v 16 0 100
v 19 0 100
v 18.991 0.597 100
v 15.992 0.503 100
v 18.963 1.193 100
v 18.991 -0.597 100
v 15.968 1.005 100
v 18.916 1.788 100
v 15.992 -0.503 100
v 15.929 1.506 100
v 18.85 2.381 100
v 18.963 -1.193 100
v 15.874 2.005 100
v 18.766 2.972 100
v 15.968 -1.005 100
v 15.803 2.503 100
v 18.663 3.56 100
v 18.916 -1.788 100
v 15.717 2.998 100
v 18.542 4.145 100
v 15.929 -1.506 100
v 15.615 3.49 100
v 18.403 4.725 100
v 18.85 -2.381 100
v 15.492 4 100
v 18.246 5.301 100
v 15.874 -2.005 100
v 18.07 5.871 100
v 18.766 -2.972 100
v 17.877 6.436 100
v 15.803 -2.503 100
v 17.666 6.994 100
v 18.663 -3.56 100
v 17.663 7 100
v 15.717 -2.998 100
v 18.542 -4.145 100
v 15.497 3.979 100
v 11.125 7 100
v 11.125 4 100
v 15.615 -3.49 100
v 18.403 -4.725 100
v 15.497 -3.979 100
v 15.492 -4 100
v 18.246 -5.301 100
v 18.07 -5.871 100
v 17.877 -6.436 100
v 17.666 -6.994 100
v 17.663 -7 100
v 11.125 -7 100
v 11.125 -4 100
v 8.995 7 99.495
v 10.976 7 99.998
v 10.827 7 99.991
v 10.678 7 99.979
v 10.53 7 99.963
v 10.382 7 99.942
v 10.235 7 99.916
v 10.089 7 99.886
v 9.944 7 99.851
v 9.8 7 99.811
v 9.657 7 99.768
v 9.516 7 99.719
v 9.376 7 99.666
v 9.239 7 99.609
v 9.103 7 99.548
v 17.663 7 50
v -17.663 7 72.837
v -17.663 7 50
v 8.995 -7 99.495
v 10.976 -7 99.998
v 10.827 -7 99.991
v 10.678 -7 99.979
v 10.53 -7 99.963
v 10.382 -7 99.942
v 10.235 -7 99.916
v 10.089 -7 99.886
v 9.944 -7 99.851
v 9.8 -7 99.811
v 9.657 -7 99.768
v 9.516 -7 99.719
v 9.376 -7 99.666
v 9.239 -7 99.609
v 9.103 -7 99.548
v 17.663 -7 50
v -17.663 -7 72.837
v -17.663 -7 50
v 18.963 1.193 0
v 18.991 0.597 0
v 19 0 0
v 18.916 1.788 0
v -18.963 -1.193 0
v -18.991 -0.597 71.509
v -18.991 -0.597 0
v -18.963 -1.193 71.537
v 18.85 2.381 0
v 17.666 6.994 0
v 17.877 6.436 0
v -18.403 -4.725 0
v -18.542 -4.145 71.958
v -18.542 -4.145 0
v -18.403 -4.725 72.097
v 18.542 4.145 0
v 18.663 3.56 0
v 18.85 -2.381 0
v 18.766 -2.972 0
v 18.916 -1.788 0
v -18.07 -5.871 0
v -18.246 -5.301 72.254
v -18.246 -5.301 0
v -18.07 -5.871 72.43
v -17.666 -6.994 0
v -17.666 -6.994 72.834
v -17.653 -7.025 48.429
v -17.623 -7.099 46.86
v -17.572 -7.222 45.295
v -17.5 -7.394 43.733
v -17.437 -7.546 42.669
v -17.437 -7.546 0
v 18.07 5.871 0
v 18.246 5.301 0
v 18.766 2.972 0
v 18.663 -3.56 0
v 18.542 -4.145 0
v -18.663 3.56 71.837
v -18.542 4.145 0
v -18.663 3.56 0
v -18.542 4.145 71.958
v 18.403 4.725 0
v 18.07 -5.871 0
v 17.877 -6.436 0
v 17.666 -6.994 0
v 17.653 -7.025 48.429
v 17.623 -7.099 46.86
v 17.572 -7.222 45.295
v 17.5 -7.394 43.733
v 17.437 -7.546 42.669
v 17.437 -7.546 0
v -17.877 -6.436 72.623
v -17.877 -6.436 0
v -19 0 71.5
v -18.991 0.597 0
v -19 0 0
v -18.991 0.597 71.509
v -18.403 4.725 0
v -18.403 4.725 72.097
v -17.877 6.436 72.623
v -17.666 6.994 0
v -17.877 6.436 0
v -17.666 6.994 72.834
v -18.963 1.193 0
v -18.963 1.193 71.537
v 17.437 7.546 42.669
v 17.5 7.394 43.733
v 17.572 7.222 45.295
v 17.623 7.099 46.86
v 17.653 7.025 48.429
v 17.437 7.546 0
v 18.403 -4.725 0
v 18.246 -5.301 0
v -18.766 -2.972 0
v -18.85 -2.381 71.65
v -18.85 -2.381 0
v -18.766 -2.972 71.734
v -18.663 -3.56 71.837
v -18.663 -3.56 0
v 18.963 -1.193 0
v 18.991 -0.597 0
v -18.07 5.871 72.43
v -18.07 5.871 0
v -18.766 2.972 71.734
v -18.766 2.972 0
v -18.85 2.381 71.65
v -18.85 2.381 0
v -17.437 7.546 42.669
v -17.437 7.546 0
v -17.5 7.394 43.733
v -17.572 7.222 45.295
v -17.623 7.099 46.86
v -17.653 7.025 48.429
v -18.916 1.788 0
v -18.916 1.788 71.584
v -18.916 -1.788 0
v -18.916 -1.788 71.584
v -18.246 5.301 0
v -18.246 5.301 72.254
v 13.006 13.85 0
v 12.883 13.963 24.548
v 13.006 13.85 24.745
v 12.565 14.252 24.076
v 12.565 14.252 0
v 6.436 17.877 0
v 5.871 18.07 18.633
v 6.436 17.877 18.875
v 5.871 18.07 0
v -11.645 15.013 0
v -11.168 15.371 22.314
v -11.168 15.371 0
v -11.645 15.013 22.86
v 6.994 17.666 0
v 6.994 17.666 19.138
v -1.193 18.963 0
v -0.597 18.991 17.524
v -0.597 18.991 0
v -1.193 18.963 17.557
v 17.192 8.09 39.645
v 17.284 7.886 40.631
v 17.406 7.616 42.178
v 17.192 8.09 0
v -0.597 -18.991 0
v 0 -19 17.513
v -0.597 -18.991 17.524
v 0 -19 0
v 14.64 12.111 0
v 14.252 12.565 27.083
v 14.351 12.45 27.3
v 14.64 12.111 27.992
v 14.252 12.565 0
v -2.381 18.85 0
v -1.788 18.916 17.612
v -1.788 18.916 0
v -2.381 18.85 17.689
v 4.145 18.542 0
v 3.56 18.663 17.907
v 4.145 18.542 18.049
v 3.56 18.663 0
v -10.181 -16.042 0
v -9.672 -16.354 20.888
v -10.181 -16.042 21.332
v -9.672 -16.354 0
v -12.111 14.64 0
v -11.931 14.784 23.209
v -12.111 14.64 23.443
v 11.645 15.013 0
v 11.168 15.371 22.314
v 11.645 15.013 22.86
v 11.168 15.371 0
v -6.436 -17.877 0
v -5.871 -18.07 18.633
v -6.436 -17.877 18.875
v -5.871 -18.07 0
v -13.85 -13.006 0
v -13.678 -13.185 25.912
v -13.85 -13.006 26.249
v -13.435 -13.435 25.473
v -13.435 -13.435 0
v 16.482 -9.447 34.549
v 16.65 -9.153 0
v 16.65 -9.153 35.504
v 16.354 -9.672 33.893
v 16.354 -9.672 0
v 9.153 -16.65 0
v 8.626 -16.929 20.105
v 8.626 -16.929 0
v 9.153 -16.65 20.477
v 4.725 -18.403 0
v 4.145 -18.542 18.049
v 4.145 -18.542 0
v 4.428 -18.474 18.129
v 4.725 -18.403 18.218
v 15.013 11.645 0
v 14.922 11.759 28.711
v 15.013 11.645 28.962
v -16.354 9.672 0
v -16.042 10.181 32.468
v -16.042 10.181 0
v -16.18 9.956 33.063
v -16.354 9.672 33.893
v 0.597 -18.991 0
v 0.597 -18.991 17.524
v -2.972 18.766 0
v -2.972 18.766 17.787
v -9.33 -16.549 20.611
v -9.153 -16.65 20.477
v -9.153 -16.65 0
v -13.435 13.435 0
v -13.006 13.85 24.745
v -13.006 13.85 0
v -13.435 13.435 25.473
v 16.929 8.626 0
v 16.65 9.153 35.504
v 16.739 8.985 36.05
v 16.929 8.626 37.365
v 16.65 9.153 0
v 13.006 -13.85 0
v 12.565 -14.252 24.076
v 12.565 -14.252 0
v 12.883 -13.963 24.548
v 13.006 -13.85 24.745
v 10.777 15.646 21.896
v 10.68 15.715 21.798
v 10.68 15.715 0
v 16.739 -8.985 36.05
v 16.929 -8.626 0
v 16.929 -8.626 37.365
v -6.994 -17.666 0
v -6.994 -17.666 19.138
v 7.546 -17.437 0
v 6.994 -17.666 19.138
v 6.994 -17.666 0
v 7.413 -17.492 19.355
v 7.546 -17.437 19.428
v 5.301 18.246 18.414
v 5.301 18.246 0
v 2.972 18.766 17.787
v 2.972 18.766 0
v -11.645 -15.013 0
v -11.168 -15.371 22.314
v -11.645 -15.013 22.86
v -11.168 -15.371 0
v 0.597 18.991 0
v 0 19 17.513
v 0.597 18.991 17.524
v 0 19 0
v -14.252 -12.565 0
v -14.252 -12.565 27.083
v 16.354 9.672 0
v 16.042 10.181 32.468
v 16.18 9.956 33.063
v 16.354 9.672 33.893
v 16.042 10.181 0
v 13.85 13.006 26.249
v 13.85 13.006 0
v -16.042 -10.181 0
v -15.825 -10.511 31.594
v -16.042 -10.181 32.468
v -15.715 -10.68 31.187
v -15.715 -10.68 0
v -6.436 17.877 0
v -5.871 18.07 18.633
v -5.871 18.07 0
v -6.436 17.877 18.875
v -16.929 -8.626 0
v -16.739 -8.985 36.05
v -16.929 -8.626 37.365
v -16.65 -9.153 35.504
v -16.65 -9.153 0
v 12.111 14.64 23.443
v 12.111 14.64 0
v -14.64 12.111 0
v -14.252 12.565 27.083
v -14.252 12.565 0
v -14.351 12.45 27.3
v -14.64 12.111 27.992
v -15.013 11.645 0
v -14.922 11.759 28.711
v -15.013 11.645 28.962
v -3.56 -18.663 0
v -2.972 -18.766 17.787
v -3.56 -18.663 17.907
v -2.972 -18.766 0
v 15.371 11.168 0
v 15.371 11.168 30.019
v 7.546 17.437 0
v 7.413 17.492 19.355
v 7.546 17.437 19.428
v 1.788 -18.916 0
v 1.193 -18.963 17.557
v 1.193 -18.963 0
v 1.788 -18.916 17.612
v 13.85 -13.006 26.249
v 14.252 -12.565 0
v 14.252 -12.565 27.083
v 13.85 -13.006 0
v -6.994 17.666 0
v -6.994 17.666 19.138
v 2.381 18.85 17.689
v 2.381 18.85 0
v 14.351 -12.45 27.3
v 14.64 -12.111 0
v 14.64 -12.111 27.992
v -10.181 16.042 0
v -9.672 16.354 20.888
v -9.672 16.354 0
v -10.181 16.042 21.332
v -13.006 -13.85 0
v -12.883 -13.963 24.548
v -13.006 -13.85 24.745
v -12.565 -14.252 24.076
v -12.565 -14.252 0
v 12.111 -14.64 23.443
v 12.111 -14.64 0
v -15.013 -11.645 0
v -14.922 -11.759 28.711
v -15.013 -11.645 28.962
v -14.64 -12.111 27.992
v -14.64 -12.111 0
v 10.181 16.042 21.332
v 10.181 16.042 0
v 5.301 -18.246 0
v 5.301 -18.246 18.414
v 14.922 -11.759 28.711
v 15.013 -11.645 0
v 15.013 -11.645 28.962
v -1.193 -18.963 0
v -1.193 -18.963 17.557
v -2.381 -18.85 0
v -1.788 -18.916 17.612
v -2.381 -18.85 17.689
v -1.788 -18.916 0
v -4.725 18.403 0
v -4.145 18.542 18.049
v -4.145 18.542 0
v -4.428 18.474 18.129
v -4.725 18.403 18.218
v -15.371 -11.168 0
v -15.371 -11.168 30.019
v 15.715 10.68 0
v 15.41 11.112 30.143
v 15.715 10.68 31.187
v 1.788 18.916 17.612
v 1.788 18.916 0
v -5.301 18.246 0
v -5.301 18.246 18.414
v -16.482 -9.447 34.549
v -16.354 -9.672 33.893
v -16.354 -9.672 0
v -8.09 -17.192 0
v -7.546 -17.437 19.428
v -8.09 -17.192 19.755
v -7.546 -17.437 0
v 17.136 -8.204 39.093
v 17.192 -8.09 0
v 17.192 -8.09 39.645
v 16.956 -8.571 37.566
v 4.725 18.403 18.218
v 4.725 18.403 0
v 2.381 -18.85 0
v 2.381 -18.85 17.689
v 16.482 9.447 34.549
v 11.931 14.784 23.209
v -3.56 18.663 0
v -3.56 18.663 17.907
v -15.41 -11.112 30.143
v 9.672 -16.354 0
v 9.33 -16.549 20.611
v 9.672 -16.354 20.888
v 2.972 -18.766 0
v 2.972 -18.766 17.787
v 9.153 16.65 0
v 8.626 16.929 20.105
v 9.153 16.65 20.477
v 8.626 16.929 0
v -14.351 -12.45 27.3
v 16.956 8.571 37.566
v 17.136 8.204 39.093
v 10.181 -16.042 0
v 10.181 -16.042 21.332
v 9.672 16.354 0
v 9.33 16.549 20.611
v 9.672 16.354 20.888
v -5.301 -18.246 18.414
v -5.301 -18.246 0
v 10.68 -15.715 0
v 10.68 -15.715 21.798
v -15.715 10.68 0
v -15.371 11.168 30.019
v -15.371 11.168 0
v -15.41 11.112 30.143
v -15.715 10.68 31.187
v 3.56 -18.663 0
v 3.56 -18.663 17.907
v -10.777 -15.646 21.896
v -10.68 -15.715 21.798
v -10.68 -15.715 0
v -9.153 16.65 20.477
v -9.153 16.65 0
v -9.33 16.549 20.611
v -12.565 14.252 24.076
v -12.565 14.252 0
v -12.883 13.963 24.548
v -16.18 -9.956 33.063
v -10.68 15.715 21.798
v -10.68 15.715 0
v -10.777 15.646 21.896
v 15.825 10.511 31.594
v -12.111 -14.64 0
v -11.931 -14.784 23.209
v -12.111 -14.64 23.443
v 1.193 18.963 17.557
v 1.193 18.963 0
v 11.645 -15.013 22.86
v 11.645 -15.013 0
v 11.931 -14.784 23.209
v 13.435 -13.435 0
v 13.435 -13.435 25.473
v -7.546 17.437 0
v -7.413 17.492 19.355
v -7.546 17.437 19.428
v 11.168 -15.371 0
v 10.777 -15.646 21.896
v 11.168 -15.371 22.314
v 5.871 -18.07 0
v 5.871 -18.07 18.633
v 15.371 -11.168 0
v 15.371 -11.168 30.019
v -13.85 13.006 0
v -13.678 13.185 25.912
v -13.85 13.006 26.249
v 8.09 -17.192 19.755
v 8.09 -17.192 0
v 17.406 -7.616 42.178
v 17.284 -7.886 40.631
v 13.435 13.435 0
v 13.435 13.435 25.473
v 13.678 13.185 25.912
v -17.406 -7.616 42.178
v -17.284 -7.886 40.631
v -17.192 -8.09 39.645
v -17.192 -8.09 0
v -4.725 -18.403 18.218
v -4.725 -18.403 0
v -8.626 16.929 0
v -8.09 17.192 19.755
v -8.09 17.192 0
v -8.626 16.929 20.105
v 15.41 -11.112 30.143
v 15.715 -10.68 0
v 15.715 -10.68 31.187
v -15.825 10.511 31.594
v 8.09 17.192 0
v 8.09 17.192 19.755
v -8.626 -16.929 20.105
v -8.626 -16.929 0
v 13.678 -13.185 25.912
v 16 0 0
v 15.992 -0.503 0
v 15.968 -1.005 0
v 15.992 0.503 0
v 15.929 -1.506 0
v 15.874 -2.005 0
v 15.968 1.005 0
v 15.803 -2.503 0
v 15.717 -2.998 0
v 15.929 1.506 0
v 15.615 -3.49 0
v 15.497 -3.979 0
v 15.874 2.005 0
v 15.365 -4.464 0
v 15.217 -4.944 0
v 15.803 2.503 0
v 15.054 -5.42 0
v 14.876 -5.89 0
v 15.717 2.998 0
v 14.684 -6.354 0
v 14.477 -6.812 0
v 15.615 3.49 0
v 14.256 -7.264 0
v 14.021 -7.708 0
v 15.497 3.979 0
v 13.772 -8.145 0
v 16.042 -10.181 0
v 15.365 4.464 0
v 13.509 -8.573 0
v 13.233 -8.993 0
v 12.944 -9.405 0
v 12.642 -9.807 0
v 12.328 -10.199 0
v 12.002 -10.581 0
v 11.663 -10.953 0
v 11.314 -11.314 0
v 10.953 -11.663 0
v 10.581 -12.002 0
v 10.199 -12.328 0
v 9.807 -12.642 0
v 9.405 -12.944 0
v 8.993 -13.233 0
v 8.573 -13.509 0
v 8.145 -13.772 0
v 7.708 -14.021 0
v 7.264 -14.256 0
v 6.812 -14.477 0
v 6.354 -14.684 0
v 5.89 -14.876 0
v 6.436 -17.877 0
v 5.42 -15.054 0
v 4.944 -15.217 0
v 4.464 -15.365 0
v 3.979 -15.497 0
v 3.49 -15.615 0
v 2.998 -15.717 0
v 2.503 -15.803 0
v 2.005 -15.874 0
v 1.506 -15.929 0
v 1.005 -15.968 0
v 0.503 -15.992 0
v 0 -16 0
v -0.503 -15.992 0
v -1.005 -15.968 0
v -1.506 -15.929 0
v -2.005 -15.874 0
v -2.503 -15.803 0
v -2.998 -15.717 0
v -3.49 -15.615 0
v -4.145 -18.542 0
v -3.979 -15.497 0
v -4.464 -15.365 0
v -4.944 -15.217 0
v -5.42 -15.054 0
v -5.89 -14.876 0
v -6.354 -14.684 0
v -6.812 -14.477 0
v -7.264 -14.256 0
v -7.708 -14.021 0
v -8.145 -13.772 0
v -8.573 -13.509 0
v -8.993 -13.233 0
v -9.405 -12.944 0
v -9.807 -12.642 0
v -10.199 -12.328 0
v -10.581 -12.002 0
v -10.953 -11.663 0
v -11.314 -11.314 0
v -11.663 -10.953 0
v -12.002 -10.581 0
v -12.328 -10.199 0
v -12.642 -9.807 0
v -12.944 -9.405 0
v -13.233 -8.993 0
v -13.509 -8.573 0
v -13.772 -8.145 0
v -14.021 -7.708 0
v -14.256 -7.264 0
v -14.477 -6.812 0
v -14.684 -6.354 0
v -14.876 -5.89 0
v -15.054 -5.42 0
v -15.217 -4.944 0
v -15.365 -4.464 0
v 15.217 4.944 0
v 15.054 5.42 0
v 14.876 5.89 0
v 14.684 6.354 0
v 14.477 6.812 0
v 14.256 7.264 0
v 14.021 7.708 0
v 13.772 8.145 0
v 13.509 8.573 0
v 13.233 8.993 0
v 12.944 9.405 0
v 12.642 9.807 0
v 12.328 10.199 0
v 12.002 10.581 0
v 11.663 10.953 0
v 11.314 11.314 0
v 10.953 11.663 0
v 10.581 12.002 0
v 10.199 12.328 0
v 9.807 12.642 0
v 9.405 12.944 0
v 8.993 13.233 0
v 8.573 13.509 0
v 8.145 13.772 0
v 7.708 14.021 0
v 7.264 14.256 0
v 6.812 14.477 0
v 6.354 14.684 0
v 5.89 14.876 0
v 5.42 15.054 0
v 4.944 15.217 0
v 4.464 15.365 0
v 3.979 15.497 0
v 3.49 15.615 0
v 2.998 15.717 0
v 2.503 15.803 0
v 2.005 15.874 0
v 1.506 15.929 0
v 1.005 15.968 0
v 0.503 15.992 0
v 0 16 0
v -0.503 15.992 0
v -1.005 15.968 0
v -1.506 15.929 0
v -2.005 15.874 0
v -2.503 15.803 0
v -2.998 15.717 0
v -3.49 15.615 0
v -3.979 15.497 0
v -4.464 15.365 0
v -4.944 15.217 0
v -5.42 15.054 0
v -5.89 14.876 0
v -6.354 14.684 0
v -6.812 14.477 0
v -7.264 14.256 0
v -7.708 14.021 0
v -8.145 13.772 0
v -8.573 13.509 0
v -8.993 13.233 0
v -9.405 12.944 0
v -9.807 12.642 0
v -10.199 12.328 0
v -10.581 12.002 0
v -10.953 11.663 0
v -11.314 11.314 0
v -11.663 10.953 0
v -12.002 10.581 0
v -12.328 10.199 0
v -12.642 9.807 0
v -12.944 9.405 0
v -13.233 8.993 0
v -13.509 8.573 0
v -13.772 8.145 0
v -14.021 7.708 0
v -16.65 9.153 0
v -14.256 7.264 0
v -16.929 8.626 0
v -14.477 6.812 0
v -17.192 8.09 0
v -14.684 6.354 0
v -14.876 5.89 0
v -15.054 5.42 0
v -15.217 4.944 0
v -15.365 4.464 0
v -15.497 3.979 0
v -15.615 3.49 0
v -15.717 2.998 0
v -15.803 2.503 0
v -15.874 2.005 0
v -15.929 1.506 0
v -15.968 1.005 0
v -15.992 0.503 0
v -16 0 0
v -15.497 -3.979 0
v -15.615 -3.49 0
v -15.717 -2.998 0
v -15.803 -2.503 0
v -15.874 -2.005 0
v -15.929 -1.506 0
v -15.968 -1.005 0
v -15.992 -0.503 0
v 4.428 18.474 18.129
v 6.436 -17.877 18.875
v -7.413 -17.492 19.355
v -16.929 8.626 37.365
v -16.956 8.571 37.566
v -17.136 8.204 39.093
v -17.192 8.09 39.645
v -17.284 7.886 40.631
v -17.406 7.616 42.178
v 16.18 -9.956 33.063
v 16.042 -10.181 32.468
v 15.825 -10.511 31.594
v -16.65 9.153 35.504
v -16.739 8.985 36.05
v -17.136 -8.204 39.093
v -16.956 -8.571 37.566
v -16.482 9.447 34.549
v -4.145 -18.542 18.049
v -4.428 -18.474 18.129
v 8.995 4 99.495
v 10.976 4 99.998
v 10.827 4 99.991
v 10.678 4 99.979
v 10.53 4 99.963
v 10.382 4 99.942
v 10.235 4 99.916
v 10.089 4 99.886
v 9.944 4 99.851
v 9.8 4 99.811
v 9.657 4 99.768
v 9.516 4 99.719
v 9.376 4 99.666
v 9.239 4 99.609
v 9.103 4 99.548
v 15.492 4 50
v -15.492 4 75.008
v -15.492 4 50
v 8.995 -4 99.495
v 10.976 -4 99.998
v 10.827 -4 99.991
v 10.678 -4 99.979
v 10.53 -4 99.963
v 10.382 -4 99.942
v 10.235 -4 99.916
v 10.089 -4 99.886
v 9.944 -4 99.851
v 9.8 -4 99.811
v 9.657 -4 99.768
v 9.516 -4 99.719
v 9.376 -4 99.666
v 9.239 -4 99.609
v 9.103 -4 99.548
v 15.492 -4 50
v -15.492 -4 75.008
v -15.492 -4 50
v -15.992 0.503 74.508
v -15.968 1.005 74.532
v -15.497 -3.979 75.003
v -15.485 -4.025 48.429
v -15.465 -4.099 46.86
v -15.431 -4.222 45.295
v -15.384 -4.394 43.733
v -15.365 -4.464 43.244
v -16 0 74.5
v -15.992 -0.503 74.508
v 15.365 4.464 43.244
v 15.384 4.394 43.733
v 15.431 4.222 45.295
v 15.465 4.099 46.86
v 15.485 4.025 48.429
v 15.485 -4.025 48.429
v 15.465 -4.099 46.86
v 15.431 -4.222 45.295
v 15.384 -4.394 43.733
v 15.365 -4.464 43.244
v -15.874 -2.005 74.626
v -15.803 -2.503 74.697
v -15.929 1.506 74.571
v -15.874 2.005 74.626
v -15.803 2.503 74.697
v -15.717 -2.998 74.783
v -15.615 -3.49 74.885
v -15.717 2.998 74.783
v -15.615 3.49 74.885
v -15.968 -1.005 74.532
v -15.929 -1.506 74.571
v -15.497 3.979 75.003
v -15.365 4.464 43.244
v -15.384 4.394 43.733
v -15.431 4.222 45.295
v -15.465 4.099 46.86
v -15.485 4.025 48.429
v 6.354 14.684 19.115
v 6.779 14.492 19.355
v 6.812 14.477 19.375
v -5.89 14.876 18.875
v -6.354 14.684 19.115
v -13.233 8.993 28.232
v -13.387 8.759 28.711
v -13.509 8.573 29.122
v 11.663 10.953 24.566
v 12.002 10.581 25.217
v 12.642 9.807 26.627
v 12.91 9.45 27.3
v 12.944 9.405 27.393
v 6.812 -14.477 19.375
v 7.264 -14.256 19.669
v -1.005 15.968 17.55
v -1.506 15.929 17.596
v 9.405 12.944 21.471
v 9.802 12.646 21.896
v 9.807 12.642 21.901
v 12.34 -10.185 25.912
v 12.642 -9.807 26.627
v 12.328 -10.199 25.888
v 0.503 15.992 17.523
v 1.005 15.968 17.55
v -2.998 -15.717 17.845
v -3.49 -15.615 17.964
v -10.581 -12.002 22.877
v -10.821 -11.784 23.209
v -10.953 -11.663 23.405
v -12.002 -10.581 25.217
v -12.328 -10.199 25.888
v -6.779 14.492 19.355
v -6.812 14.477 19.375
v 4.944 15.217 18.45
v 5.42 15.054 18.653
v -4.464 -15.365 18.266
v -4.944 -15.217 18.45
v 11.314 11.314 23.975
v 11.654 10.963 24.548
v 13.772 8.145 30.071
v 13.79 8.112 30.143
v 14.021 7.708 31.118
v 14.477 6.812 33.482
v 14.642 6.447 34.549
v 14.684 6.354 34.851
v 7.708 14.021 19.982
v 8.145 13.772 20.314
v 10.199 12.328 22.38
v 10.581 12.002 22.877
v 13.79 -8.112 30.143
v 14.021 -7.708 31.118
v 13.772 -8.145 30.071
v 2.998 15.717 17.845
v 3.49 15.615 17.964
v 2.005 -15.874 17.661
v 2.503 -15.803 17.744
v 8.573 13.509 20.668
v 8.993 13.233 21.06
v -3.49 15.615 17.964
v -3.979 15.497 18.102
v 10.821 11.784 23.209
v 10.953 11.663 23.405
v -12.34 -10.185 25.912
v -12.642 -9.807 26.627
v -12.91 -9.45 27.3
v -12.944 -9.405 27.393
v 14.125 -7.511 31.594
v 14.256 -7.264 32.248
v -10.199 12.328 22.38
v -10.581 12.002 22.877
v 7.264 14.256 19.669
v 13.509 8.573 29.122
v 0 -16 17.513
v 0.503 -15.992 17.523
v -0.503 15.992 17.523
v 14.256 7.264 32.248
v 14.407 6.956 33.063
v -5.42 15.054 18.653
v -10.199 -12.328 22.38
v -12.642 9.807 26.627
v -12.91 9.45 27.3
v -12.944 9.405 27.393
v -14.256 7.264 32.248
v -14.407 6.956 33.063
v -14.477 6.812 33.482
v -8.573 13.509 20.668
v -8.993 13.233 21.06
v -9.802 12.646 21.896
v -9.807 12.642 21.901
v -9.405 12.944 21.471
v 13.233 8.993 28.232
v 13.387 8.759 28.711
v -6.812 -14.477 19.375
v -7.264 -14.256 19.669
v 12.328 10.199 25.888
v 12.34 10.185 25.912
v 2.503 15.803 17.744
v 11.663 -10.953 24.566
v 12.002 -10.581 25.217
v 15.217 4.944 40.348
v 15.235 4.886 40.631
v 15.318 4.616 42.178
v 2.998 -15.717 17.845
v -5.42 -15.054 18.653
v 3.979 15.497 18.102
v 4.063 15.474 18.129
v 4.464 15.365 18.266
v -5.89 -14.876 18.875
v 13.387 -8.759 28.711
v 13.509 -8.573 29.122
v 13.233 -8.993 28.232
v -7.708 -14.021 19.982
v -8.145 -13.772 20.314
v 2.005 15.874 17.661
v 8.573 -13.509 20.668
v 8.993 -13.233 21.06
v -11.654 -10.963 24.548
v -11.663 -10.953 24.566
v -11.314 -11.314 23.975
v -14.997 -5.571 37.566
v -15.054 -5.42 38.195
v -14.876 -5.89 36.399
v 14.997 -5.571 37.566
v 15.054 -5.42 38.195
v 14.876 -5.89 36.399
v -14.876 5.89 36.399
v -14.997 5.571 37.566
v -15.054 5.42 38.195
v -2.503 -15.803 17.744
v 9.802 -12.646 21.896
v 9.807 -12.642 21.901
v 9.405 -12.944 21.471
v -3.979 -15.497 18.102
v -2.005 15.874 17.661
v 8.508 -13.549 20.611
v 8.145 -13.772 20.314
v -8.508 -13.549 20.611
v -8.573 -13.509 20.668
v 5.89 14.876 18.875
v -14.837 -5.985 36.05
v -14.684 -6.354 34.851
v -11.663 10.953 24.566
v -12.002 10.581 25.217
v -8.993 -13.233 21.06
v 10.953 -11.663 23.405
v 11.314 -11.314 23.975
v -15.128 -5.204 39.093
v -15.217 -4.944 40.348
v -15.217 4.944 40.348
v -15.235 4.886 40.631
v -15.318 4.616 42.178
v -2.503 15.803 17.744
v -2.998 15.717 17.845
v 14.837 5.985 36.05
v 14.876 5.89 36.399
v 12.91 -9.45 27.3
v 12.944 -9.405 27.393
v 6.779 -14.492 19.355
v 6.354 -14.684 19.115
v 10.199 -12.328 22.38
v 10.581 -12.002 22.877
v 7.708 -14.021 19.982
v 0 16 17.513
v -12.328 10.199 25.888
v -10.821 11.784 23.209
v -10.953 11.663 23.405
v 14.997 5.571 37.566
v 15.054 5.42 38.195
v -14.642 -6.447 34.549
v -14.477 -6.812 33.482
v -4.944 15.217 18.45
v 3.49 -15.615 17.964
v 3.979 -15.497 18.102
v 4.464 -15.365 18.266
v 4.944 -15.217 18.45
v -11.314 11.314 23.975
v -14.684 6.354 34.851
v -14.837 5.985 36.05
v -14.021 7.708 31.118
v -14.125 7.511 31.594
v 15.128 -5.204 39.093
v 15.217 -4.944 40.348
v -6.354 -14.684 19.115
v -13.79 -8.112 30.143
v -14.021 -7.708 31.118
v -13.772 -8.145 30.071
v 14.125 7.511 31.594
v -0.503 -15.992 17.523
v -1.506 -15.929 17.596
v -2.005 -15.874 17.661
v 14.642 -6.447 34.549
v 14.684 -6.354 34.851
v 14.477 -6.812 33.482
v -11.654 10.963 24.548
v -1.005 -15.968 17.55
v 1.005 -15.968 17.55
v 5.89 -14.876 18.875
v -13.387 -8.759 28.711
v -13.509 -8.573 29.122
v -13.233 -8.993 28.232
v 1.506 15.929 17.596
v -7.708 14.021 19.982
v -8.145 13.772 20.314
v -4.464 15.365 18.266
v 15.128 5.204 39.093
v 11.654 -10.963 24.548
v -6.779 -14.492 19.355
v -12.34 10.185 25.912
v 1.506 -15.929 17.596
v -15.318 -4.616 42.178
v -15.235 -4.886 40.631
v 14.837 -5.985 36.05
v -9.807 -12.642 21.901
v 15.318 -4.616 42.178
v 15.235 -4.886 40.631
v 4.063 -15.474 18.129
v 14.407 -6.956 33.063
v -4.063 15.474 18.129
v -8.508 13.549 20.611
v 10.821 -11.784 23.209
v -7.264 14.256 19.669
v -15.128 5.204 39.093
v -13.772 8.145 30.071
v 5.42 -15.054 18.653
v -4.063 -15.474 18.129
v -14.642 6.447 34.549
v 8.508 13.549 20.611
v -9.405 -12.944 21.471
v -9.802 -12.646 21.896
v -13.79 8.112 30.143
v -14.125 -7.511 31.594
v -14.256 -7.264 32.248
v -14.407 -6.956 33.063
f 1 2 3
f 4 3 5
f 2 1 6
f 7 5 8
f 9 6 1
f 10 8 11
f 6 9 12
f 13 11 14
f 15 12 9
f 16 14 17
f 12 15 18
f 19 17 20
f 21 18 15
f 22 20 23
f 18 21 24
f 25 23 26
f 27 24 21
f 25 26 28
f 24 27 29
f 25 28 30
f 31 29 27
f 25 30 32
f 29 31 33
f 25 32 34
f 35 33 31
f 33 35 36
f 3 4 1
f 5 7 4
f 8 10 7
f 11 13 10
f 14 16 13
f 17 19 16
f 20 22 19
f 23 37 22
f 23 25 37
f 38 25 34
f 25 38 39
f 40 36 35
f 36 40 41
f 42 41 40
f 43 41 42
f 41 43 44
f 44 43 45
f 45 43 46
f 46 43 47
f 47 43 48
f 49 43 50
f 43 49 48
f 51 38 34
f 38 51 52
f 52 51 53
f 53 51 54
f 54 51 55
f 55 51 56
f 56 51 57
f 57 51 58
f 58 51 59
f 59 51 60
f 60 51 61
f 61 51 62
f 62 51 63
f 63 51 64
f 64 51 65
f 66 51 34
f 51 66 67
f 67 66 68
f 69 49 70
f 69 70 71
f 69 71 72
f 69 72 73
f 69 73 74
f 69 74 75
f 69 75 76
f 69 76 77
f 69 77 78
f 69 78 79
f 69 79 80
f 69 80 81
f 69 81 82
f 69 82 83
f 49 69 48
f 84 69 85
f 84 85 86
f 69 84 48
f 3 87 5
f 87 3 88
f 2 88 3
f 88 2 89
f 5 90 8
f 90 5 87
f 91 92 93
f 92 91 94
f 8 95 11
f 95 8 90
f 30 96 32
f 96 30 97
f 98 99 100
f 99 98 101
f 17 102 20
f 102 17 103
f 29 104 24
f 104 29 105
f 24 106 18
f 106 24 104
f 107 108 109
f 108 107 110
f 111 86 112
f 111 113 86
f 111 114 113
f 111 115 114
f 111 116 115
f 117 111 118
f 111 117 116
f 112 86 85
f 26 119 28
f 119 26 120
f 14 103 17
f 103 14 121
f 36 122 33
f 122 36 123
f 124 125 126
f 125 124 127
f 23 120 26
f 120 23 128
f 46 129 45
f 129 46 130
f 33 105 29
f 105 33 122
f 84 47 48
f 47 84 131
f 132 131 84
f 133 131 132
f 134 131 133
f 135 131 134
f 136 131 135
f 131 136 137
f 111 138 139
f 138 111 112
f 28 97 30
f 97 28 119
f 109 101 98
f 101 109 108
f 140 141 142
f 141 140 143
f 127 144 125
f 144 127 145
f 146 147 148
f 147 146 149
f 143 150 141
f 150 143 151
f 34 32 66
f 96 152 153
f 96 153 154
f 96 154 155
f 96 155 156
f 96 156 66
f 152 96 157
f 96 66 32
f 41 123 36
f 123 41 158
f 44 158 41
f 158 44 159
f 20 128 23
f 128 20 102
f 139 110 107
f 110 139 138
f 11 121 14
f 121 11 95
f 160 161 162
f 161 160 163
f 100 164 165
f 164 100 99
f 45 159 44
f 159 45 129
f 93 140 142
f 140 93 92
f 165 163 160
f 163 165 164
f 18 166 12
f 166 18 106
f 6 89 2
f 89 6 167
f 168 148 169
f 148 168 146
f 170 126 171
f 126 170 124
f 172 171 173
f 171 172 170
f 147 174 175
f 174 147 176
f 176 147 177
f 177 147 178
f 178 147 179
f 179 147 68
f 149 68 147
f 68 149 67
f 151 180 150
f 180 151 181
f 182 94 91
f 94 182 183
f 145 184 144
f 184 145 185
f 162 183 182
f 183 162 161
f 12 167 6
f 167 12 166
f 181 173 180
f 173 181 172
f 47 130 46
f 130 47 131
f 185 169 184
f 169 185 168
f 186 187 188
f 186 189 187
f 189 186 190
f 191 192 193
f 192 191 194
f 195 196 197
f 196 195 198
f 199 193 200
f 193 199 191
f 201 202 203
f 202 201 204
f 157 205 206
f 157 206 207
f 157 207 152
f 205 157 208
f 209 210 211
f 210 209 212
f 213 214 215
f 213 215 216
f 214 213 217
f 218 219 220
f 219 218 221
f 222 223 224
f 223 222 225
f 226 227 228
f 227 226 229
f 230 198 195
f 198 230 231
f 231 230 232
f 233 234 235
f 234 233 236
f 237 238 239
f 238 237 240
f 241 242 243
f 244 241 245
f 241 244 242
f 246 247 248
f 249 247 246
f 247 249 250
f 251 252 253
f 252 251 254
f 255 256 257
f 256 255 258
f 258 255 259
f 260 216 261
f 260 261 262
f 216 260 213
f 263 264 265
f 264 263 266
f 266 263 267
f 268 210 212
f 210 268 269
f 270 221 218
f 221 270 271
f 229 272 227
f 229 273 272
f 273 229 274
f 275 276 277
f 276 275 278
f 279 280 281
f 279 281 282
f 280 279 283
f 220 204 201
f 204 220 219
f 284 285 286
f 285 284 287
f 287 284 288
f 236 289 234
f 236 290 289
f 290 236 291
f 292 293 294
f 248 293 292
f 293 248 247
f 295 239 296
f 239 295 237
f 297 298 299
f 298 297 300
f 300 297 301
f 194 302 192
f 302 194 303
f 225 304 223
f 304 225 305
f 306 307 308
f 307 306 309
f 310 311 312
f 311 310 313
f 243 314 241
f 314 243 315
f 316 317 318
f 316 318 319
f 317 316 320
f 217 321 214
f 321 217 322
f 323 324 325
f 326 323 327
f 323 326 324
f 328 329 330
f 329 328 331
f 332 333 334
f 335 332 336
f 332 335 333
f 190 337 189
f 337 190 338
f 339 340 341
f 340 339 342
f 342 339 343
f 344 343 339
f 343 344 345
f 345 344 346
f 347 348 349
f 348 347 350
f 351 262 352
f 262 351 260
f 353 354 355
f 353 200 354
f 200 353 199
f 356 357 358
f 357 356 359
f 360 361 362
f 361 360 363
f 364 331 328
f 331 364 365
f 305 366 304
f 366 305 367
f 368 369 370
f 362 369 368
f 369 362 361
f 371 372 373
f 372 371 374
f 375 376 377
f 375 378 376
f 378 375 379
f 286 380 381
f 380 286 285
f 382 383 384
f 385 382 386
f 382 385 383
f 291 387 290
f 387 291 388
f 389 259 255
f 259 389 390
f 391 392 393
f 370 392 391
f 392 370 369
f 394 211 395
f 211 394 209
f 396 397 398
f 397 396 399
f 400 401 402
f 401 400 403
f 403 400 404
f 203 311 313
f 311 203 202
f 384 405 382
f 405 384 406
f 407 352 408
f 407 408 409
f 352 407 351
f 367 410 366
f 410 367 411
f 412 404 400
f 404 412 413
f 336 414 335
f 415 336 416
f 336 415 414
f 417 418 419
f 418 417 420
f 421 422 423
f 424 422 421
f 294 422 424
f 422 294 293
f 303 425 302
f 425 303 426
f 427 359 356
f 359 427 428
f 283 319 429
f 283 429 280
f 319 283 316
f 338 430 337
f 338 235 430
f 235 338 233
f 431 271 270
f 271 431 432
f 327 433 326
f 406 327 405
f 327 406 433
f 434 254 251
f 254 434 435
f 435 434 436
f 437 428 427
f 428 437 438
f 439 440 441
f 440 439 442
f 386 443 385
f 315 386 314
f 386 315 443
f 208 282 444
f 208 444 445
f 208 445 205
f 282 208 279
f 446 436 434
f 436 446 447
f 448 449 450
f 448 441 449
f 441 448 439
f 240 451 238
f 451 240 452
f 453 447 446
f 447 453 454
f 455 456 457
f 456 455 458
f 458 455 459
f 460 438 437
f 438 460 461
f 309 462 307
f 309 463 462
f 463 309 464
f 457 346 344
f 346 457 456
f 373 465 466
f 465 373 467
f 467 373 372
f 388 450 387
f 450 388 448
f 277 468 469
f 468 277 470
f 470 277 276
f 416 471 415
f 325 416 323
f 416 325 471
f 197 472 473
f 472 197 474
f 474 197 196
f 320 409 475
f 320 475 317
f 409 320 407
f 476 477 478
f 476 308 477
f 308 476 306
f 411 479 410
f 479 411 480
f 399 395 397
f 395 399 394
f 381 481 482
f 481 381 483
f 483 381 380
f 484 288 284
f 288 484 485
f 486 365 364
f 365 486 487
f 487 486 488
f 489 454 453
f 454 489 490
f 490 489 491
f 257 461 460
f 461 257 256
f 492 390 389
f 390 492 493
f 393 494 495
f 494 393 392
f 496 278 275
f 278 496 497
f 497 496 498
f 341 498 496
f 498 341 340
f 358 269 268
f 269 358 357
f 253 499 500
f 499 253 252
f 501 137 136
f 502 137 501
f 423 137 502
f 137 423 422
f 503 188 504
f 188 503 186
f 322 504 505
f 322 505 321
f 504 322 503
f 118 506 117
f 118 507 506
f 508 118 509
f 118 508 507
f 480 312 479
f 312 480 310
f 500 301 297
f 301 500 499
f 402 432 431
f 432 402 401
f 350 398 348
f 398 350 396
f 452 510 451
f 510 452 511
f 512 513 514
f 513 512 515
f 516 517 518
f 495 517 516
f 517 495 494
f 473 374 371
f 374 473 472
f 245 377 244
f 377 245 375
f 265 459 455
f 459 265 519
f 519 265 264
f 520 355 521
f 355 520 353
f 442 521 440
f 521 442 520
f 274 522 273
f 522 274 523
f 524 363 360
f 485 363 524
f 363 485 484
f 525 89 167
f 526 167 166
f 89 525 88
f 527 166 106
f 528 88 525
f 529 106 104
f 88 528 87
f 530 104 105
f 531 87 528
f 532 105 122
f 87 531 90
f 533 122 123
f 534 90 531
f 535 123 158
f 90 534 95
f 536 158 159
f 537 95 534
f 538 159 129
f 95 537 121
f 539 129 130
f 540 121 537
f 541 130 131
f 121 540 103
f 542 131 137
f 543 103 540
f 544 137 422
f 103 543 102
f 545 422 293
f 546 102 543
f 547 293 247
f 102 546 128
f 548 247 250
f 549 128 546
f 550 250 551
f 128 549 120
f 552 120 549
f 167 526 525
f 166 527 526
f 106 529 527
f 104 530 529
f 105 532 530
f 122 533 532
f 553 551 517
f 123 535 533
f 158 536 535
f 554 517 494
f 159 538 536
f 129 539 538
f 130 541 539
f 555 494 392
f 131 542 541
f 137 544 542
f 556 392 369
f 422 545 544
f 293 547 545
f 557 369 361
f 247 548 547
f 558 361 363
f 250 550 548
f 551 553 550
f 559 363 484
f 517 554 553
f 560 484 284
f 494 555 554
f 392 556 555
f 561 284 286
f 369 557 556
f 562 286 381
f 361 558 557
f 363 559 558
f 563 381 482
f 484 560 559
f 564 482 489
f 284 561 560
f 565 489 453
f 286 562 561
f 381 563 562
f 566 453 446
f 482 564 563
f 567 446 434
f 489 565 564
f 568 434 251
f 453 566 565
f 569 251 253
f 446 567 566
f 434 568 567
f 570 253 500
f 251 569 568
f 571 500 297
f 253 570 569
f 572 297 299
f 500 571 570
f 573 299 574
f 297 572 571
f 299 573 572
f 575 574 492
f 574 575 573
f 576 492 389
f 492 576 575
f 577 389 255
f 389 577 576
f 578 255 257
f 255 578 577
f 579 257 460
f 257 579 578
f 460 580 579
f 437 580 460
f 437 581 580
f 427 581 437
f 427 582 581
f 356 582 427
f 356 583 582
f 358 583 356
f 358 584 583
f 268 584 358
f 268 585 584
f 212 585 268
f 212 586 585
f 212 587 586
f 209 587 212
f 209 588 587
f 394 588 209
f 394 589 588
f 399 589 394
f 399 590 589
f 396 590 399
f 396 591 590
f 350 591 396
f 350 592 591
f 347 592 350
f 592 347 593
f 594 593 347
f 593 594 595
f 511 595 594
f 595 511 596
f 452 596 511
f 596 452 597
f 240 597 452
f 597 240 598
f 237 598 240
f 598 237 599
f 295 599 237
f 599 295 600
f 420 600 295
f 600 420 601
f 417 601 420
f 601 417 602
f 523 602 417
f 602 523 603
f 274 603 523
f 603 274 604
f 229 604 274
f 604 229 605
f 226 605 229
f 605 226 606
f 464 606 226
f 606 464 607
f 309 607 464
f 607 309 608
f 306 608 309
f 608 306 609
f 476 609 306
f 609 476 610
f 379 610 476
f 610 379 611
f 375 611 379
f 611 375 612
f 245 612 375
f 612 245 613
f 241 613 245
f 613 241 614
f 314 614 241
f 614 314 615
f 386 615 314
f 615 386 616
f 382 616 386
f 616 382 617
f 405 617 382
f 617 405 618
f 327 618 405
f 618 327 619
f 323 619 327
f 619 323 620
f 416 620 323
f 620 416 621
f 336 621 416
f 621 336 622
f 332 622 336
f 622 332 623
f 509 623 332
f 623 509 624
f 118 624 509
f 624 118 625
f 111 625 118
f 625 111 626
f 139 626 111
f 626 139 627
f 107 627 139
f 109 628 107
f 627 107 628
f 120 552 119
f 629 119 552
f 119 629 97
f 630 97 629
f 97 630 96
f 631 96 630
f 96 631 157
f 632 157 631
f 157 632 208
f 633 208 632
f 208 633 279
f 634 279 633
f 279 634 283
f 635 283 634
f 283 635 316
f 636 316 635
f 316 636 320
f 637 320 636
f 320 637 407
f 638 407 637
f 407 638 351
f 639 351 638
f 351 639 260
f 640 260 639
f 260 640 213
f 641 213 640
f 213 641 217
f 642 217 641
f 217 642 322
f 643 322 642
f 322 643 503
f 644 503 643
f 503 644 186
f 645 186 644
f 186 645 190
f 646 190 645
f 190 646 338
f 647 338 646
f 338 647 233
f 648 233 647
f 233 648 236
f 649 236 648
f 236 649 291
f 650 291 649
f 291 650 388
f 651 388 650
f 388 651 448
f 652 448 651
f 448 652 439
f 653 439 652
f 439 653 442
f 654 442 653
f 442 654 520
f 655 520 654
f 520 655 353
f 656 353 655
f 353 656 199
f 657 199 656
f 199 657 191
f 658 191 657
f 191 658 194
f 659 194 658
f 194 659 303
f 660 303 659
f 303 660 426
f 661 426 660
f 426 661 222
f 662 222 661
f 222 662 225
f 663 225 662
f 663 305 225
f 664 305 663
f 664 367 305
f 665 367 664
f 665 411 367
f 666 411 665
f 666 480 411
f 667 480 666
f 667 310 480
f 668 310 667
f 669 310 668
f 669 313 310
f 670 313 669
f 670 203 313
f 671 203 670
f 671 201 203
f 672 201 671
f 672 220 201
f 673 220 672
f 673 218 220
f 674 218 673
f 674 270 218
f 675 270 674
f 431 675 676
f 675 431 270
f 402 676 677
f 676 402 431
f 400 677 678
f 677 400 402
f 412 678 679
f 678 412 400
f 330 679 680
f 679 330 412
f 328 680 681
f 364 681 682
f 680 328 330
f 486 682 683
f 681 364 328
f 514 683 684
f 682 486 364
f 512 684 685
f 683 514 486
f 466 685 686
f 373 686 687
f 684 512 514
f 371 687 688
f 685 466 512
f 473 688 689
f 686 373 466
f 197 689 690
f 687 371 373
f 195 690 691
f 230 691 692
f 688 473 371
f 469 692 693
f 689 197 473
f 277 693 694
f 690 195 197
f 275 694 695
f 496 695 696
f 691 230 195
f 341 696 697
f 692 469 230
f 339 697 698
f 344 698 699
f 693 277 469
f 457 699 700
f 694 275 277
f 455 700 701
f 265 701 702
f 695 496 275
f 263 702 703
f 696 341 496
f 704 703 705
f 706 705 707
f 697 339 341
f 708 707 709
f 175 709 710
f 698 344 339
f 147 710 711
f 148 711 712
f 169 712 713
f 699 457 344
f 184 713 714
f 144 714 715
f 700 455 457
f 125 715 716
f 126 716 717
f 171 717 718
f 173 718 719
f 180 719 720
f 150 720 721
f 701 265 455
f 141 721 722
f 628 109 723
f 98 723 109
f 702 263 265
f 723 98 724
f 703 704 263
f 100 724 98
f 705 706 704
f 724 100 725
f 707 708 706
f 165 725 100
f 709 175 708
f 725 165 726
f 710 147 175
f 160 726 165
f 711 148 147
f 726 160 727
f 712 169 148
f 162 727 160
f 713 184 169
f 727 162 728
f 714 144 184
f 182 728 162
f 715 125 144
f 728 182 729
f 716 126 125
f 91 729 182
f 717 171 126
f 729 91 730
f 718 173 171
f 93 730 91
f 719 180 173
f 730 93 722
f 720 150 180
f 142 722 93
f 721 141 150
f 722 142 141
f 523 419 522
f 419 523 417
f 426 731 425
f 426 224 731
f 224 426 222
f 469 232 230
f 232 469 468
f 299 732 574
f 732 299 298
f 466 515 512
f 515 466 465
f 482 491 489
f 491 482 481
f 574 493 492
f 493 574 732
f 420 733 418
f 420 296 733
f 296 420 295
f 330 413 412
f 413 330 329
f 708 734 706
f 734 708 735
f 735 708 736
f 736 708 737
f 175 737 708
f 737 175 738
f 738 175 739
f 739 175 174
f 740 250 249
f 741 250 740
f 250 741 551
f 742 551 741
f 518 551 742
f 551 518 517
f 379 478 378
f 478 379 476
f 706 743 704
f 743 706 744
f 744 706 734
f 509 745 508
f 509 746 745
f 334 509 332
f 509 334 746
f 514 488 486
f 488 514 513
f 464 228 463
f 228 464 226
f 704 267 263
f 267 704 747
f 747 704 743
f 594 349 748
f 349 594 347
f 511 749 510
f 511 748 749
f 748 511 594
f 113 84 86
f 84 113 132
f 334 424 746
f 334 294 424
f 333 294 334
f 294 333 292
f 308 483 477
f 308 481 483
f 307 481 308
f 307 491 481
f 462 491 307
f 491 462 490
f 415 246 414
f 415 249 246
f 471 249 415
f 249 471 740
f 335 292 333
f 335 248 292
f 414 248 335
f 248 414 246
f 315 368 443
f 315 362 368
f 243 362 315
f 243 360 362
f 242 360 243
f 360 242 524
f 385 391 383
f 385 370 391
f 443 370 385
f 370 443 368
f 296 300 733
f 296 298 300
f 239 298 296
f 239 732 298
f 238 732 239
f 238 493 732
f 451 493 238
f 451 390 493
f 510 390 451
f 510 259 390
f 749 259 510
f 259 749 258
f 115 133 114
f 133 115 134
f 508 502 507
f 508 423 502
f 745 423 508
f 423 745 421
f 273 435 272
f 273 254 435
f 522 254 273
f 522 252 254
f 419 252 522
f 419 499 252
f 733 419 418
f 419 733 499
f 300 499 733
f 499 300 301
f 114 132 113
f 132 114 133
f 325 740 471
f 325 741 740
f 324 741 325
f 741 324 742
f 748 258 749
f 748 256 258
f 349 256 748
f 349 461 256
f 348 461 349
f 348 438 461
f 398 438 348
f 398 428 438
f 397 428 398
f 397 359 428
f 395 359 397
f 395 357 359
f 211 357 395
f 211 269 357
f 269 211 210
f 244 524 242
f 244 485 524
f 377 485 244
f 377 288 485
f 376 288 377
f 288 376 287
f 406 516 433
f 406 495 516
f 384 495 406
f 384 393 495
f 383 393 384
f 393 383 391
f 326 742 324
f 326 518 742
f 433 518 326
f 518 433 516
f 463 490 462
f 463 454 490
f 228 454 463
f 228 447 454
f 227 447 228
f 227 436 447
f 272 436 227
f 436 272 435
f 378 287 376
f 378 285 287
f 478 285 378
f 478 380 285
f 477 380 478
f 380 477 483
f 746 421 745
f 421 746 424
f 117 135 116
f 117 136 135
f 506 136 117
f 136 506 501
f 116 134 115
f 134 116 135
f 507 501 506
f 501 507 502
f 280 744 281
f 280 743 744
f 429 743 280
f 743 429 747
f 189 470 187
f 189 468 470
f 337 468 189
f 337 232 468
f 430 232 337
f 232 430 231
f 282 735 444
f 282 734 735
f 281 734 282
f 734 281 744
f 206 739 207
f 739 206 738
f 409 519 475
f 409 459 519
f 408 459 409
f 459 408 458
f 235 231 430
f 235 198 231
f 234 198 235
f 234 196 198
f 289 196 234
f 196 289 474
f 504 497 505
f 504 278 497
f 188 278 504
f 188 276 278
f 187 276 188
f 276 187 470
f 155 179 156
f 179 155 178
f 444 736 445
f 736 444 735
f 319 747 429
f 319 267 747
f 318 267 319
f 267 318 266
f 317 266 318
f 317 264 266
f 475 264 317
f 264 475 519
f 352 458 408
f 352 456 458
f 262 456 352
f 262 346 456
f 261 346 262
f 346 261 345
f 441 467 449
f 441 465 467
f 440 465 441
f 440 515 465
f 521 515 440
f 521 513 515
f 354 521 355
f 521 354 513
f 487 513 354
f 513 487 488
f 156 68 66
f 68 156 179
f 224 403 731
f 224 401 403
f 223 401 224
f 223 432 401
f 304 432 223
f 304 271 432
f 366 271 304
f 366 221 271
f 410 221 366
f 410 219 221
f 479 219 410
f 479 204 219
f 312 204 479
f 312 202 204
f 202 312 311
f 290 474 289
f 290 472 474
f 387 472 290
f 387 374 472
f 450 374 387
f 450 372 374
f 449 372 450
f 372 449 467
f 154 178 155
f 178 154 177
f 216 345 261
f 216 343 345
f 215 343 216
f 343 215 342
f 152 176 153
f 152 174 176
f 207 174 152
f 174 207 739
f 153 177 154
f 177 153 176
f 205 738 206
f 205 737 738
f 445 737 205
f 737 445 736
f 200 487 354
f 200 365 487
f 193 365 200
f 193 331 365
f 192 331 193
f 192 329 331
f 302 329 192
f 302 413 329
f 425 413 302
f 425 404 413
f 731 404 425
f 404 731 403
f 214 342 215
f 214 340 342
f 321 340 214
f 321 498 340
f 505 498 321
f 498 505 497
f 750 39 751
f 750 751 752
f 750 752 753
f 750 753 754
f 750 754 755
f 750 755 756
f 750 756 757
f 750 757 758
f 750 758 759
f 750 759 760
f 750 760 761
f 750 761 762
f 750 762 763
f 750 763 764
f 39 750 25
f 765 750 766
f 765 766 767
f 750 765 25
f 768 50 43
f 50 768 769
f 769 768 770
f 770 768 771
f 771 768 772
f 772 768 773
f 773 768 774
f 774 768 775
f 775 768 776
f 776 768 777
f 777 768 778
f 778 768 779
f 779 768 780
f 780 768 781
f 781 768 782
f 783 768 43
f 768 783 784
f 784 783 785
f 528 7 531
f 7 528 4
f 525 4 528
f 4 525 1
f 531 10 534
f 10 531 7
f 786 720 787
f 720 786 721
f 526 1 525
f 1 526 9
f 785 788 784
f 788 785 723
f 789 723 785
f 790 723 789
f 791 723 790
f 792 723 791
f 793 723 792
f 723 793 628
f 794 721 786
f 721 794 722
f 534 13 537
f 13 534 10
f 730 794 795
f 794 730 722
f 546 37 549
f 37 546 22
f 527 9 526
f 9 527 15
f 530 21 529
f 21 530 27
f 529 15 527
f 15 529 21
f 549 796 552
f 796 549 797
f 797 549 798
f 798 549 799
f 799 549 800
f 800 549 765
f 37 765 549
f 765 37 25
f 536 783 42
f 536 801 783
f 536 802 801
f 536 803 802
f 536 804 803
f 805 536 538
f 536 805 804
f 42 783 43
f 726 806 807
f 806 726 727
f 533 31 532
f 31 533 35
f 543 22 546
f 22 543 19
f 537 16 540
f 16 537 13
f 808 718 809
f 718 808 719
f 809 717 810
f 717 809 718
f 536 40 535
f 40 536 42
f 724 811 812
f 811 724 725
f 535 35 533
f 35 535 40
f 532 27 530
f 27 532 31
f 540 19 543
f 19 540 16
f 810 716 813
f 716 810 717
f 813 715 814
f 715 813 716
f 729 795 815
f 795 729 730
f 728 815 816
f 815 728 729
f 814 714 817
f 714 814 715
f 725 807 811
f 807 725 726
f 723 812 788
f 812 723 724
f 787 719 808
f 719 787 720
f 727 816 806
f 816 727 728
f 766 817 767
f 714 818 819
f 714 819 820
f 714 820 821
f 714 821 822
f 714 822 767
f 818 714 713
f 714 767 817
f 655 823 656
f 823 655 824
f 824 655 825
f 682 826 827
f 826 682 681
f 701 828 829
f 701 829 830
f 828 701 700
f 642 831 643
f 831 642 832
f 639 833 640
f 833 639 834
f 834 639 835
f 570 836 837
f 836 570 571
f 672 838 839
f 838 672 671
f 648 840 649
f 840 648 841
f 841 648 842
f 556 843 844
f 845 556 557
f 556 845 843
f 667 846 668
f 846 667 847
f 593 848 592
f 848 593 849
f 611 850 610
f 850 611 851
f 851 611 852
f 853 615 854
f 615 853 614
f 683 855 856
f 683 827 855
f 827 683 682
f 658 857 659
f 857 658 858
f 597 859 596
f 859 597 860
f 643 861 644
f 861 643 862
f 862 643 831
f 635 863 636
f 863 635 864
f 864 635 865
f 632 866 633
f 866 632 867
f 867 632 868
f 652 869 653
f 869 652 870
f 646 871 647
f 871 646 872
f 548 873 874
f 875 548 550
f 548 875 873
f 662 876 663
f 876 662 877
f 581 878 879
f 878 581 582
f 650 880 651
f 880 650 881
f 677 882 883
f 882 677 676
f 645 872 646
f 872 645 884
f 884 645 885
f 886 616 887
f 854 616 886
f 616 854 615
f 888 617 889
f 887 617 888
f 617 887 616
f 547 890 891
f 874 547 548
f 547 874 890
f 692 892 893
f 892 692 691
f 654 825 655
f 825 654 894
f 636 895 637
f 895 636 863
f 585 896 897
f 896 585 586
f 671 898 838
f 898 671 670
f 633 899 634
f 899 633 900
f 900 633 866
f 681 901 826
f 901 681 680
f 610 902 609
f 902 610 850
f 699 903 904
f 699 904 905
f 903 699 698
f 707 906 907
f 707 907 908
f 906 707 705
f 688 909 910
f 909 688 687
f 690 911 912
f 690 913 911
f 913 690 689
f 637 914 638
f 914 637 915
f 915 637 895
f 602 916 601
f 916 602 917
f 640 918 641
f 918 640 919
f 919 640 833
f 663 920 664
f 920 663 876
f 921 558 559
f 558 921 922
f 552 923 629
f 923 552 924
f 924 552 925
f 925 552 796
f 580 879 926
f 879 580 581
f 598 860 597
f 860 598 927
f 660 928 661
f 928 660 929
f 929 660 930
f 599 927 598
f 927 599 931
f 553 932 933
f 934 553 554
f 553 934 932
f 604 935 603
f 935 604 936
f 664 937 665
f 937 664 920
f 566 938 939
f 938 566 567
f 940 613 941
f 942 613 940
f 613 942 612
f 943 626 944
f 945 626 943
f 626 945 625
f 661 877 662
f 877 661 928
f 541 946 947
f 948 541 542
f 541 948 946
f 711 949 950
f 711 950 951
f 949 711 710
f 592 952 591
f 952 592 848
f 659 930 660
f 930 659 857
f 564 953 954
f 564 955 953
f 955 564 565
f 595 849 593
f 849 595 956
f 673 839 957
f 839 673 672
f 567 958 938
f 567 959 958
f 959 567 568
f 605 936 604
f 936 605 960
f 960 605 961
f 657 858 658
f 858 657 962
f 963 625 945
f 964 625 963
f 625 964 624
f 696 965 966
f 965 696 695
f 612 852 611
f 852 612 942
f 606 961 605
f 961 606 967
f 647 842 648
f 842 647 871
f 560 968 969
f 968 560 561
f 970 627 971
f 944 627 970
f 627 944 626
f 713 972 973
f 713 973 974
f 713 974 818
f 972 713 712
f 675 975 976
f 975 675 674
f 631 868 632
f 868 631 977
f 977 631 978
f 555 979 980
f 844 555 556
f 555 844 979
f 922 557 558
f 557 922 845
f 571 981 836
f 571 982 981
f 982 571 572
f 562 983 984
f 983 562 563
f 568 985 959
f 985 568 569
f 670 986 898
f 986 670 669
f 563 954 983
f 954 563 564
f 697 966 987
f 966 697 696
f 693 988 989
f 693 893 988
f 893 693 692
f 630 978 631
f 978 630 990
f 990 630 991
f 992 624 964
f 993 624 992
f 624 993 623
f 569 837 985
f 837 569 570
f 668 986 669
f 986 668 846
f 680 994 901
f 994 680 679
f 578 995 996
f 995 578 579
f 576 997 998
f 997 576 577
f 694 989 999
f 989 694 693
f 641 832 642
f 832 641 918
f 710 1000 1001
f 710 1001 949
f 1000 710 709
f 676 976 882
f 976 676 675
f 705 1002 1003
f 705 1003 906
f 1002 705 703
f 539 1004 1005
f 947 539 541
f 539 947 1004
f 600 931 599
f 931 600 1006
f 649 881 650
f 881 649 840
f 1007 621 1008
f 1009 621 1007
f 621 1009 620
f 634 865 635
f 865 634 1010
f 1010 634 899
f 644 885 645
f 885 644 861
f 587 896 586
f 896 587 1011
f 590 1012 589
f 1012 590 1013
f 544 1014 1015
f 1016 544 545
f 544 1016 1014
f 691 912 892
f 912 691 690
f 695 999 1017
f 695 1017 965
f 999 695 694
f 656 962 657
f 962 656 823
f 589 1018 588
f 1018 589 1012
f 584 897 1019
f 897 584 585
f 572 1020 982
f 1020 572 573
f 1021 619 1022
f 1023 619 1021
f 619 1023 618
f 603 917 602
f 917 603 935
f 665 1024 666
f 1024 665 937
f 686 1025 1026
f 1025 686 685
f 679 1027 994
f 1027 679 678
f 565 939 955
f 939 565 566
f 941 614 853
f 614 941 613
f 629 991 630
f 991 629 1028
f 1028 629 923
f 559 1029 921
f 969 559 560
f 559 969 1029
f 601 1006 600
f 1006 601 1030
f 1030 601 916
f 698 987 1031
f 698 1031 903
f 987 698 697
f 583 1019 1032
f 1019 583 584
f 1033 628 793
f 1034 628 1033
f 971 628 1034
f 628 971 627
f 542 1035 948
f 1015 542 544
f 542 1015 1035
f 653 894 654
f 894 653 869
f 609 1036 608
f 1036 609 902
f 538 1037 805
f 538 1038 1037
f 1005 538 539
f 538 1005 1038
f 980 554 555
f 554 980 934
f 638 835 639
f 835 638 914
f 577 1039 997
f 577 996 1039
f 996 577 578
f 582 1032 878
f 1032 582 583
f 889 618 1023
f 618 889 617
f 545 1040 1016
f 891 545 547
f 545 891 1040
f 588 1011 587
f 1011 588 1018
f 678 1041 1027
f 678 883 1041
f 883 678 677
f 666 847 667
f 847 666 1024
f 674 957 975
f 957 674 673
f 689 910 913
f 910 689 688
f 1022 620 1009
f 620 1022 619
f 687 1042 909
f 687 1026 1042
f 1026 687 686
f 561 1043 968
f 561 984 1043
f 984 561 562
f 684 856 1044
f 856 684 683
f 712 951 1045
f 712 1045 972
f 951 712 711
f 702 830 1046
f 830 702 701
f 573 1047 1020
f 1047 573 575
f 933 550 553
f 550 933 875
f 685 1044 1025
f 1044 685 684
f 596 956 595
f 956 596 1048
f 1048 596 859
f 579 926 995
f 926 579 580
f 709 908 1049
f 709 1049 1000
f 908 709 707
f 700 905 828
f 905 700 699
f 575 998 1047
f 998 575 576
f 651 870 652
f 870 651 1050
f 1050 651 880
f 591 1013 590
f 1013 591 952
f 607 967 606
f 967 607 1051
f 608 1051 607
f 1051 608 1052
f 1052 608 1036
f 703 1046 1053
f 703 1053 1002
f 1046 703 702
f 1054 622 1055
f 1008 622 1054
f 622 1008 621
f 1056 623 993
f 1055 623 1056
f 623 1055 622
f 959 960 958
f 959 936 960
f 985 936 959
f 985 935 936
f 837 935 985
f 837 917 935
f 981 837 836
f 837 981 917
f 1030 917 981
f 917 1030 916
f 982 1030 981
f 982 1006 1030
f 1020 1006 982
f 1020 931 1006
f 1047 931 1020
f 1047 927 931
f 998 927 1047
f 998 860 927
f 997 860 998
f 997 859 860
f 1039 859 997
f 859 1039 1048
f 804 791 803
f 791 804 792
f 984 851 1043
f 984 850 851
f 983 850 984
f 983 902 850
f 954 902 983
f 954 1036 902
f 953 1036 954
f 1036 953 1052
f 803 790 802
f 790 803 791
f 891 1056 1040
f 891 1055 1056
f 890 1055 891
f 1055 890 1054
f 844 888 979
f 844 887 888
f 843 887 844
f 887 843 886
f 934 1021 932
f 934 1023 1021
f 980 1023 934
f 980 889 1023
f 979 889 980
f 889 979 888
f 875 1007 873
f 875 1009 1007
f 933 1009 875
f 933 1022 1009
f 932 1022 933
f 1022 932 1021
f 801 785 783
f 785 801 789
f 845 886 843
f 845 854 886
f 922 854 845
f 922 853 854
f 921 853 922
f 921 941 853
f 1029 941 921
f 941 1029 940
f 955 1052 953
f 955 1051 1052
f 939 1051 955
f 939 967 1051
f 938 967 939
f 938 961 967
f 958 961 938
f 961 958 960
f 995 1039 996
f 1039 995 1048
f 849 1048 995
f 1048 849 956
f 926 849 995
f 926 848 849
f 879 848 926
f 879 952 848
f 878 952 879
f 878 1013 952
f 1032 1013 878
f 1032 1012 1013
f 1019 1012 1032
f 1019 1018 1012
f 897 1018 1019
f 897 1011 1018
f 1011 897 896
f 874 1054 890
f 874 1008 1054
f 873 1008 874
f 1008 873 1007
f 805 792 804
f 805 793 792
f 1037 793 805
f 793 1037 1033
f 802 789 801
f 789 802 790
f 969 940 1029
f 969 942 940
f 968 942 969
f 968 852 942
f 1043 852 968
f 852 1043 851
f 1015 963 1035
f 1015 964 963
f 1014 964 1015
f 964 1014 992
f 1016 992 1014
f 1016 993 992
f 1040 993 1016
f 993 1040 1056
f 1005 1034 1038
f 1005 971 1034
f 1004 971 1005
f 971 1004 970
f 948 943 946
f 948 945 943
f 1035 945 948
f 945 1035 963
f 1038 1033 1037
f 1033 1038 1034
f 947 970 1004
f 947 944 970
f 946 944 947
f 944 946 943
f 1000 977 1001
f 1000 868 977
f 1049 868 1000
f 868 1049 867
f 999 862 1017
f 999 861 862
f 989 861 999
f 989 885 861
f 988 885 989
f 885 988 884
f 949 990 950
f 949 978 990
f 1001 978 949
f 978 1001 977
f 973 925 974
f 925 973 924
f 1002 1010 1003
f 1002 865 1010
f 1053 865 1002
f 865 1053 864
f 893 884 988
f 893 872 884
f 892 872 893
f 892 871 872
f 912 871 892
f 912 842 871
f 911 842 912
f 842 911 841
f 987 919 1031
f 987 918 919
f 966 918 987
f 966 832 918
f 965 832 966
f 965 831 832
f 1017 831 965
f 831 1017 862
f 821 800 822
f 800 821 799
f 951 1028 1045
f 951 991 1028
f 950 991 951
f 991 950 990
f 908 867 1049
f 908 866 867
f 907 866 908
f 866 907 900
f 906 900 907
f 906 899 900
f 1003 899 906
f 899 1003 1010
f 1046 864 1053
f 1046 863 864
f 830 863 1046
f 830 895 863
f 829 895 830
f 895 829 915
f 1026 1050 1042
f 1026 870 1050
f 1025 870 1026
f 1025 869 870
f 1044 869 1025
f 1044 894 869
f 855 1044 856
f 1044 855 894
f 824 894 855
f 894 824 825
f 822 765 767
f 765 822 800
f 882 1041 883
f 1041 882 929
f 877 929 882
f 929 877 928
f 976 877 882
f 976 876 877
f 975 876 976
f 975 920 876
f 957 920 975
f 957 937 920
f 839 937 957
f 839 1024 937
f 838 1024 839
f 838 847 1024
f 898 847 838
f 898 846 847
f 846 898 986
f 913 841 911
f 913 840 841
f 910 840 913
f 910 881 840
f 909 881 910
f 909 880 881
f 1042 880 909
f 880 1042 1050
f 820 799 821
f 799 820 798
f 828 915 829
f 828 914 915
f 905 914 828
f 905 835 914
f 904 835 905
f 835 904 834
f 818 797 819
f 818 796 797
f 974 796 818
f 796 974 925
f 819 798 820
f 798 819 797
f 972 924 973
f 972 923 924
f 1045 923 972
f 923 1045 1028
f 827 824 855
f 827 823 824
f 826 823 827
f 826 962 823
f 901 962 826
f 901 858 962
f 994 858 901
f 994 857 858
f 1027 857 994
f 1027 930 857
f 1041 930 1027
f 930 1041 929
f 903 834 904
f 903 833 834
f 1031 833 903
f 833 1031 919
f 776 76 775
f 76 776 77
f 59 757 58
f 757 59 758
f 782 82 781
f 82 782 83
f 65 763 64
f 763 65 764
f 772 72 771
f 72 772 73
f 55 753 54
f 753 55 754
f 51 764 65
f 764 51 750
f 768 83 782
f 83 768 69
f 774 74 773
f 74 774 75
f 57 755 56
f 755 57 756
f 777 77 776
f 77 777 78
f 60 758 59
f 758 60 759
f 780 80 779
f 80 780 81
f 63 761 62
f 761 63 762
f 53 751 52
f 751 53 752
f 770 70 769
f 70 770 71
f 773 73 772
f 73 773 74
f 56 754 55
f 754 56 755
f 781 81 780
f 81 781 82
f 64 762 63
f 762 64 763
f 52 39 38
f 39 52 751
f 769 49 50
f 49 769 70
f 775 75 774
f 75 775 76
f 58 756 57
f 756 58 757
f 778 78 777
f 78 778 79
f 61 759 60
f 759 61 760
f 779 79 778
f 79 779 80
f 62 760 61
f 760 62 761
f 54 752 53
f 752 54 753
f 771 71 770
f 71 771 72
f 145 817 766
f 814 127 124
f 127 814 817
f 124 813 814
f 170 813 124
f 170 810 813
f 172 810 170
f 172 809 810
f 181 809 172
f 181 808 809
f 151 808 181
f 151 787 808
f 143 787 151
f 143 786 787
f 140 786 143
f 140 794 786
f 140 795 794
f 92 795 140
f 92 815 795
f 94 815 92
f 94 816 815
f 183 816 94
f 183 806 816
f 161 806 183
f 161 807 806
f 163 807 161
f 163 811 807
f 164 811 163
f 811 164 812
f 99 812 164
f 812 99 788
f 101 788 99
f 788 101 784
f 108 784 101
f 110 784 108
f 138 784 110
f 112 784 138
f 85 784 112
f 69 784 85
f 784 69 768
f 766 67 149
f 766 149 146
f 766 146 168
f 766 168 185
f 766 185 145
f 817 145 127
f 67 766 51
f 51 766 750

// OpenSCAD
// How thick should the shaft be to fit your vaccuum?
shaft_diameter = 32; // [10:60]

// How wide should the tip of the nozzle open?
nozzle_opening = 8; // [1:20]

// How long should the crevice be in total?
crevice_length = 100; // [100:500]

// How thick should the walls of the nozzle be? (Thinner = less filament usage but more likely to break)
wall_thickness = 3; // [1:10]

module shape(rohrdurchmesser, duesenstaerke, laenge){
		
	difference(){		
		union(){
			cylinder(laenge/2, r=rohrdurchmesser/2);
			intersection(){
					translate([-rohrdurchmesser/2,-duesenstaerke/2,laenge/2]) 
						cube([rohrdurchmesser,duesenstaerke,laenge/2]);
					translate([0,0,laenge/2]) 
						cylinder(laenge/2, r=rohrdurchmesser/2);
			}
		}
		for(i = [[-rohrdurchmesser/2,-laenge/2-duesenstaerke/2,laenge/2],[-rohrdurchmesser/2,laenge/2+duesenstaerke/2,laenge/2]])			
			translate(i)
			rotate([0,90,0]) 
			cylinder(rohrdurchmesser, r=laenge/2);
	}
}

module fugenduese(rohrdurchmesser, duesenstaerke, laenge, wandstaerke){
$fn = 200;
blocklaenge = sqrt(pow((rohrdurchmesser+2*wandstaerke)*3/4,2)*2);
	difference(){
		shape(rohrdurchmesser+wandstaerke*2,duesenstaerke+wandstaerke*2,laenge); // duese erstellen

		translate([0,0,0]) shape(rohrdurchmesser,duesenstaerke,laenge); //duese aushoehlen

		translate ([(rohrdurchmesser+2*wandstaerke)/4,0,laenge])
	   rotate([0,-45,0]) translate([-blocklaenge,-(duesenstaerke+wandstaerke*2)/2-0.005,0]) cube([blocklaenge,duesenstaerke+wandstaerke*2+0.01,blocklaenge]); //im 45Grad Winkel abschneiden

		difference(){ 

			translate([(rohrdurchmesser+2*wandstaerke)/8+(rohrdurchmesser+2*wandstaerke)/16,-(duesenstaerke+2*wandstaerke)/2-0.005,laenge-(rohrdurchmesser+2*wandstaerke)/8/4+0.005]) cube([(rohrdurchmesser)/8, duesenstaerke+2*wandstaerke+0.01 ,(rohrdurchmesser+2*wandstaerke)/8/4+0.005]);

			translate([
(rohrdurchmesser+2*wandstaerke)/4+(((rohrdurchmesser)/8)-sqrt(pow((rohrdurchmesser+2*wandstaerke)/8,2))/2),
duesenstaerke/2+wandstaerke+0.01,
laenge-(rohrdurchmesser+2*wandstaerke)/8]) 
rotate([90,0,0]) cylinder(duesenstaerke+wandstaerke*2+0.02, r = (rohrdurchmesser+2*wandstaerke)/8);

		} // die Ecke der Schnittkante abrunden
	}


}

fugenduese(shaft_diameter,nozzle_opening,crevice_length,wall_thickness);
